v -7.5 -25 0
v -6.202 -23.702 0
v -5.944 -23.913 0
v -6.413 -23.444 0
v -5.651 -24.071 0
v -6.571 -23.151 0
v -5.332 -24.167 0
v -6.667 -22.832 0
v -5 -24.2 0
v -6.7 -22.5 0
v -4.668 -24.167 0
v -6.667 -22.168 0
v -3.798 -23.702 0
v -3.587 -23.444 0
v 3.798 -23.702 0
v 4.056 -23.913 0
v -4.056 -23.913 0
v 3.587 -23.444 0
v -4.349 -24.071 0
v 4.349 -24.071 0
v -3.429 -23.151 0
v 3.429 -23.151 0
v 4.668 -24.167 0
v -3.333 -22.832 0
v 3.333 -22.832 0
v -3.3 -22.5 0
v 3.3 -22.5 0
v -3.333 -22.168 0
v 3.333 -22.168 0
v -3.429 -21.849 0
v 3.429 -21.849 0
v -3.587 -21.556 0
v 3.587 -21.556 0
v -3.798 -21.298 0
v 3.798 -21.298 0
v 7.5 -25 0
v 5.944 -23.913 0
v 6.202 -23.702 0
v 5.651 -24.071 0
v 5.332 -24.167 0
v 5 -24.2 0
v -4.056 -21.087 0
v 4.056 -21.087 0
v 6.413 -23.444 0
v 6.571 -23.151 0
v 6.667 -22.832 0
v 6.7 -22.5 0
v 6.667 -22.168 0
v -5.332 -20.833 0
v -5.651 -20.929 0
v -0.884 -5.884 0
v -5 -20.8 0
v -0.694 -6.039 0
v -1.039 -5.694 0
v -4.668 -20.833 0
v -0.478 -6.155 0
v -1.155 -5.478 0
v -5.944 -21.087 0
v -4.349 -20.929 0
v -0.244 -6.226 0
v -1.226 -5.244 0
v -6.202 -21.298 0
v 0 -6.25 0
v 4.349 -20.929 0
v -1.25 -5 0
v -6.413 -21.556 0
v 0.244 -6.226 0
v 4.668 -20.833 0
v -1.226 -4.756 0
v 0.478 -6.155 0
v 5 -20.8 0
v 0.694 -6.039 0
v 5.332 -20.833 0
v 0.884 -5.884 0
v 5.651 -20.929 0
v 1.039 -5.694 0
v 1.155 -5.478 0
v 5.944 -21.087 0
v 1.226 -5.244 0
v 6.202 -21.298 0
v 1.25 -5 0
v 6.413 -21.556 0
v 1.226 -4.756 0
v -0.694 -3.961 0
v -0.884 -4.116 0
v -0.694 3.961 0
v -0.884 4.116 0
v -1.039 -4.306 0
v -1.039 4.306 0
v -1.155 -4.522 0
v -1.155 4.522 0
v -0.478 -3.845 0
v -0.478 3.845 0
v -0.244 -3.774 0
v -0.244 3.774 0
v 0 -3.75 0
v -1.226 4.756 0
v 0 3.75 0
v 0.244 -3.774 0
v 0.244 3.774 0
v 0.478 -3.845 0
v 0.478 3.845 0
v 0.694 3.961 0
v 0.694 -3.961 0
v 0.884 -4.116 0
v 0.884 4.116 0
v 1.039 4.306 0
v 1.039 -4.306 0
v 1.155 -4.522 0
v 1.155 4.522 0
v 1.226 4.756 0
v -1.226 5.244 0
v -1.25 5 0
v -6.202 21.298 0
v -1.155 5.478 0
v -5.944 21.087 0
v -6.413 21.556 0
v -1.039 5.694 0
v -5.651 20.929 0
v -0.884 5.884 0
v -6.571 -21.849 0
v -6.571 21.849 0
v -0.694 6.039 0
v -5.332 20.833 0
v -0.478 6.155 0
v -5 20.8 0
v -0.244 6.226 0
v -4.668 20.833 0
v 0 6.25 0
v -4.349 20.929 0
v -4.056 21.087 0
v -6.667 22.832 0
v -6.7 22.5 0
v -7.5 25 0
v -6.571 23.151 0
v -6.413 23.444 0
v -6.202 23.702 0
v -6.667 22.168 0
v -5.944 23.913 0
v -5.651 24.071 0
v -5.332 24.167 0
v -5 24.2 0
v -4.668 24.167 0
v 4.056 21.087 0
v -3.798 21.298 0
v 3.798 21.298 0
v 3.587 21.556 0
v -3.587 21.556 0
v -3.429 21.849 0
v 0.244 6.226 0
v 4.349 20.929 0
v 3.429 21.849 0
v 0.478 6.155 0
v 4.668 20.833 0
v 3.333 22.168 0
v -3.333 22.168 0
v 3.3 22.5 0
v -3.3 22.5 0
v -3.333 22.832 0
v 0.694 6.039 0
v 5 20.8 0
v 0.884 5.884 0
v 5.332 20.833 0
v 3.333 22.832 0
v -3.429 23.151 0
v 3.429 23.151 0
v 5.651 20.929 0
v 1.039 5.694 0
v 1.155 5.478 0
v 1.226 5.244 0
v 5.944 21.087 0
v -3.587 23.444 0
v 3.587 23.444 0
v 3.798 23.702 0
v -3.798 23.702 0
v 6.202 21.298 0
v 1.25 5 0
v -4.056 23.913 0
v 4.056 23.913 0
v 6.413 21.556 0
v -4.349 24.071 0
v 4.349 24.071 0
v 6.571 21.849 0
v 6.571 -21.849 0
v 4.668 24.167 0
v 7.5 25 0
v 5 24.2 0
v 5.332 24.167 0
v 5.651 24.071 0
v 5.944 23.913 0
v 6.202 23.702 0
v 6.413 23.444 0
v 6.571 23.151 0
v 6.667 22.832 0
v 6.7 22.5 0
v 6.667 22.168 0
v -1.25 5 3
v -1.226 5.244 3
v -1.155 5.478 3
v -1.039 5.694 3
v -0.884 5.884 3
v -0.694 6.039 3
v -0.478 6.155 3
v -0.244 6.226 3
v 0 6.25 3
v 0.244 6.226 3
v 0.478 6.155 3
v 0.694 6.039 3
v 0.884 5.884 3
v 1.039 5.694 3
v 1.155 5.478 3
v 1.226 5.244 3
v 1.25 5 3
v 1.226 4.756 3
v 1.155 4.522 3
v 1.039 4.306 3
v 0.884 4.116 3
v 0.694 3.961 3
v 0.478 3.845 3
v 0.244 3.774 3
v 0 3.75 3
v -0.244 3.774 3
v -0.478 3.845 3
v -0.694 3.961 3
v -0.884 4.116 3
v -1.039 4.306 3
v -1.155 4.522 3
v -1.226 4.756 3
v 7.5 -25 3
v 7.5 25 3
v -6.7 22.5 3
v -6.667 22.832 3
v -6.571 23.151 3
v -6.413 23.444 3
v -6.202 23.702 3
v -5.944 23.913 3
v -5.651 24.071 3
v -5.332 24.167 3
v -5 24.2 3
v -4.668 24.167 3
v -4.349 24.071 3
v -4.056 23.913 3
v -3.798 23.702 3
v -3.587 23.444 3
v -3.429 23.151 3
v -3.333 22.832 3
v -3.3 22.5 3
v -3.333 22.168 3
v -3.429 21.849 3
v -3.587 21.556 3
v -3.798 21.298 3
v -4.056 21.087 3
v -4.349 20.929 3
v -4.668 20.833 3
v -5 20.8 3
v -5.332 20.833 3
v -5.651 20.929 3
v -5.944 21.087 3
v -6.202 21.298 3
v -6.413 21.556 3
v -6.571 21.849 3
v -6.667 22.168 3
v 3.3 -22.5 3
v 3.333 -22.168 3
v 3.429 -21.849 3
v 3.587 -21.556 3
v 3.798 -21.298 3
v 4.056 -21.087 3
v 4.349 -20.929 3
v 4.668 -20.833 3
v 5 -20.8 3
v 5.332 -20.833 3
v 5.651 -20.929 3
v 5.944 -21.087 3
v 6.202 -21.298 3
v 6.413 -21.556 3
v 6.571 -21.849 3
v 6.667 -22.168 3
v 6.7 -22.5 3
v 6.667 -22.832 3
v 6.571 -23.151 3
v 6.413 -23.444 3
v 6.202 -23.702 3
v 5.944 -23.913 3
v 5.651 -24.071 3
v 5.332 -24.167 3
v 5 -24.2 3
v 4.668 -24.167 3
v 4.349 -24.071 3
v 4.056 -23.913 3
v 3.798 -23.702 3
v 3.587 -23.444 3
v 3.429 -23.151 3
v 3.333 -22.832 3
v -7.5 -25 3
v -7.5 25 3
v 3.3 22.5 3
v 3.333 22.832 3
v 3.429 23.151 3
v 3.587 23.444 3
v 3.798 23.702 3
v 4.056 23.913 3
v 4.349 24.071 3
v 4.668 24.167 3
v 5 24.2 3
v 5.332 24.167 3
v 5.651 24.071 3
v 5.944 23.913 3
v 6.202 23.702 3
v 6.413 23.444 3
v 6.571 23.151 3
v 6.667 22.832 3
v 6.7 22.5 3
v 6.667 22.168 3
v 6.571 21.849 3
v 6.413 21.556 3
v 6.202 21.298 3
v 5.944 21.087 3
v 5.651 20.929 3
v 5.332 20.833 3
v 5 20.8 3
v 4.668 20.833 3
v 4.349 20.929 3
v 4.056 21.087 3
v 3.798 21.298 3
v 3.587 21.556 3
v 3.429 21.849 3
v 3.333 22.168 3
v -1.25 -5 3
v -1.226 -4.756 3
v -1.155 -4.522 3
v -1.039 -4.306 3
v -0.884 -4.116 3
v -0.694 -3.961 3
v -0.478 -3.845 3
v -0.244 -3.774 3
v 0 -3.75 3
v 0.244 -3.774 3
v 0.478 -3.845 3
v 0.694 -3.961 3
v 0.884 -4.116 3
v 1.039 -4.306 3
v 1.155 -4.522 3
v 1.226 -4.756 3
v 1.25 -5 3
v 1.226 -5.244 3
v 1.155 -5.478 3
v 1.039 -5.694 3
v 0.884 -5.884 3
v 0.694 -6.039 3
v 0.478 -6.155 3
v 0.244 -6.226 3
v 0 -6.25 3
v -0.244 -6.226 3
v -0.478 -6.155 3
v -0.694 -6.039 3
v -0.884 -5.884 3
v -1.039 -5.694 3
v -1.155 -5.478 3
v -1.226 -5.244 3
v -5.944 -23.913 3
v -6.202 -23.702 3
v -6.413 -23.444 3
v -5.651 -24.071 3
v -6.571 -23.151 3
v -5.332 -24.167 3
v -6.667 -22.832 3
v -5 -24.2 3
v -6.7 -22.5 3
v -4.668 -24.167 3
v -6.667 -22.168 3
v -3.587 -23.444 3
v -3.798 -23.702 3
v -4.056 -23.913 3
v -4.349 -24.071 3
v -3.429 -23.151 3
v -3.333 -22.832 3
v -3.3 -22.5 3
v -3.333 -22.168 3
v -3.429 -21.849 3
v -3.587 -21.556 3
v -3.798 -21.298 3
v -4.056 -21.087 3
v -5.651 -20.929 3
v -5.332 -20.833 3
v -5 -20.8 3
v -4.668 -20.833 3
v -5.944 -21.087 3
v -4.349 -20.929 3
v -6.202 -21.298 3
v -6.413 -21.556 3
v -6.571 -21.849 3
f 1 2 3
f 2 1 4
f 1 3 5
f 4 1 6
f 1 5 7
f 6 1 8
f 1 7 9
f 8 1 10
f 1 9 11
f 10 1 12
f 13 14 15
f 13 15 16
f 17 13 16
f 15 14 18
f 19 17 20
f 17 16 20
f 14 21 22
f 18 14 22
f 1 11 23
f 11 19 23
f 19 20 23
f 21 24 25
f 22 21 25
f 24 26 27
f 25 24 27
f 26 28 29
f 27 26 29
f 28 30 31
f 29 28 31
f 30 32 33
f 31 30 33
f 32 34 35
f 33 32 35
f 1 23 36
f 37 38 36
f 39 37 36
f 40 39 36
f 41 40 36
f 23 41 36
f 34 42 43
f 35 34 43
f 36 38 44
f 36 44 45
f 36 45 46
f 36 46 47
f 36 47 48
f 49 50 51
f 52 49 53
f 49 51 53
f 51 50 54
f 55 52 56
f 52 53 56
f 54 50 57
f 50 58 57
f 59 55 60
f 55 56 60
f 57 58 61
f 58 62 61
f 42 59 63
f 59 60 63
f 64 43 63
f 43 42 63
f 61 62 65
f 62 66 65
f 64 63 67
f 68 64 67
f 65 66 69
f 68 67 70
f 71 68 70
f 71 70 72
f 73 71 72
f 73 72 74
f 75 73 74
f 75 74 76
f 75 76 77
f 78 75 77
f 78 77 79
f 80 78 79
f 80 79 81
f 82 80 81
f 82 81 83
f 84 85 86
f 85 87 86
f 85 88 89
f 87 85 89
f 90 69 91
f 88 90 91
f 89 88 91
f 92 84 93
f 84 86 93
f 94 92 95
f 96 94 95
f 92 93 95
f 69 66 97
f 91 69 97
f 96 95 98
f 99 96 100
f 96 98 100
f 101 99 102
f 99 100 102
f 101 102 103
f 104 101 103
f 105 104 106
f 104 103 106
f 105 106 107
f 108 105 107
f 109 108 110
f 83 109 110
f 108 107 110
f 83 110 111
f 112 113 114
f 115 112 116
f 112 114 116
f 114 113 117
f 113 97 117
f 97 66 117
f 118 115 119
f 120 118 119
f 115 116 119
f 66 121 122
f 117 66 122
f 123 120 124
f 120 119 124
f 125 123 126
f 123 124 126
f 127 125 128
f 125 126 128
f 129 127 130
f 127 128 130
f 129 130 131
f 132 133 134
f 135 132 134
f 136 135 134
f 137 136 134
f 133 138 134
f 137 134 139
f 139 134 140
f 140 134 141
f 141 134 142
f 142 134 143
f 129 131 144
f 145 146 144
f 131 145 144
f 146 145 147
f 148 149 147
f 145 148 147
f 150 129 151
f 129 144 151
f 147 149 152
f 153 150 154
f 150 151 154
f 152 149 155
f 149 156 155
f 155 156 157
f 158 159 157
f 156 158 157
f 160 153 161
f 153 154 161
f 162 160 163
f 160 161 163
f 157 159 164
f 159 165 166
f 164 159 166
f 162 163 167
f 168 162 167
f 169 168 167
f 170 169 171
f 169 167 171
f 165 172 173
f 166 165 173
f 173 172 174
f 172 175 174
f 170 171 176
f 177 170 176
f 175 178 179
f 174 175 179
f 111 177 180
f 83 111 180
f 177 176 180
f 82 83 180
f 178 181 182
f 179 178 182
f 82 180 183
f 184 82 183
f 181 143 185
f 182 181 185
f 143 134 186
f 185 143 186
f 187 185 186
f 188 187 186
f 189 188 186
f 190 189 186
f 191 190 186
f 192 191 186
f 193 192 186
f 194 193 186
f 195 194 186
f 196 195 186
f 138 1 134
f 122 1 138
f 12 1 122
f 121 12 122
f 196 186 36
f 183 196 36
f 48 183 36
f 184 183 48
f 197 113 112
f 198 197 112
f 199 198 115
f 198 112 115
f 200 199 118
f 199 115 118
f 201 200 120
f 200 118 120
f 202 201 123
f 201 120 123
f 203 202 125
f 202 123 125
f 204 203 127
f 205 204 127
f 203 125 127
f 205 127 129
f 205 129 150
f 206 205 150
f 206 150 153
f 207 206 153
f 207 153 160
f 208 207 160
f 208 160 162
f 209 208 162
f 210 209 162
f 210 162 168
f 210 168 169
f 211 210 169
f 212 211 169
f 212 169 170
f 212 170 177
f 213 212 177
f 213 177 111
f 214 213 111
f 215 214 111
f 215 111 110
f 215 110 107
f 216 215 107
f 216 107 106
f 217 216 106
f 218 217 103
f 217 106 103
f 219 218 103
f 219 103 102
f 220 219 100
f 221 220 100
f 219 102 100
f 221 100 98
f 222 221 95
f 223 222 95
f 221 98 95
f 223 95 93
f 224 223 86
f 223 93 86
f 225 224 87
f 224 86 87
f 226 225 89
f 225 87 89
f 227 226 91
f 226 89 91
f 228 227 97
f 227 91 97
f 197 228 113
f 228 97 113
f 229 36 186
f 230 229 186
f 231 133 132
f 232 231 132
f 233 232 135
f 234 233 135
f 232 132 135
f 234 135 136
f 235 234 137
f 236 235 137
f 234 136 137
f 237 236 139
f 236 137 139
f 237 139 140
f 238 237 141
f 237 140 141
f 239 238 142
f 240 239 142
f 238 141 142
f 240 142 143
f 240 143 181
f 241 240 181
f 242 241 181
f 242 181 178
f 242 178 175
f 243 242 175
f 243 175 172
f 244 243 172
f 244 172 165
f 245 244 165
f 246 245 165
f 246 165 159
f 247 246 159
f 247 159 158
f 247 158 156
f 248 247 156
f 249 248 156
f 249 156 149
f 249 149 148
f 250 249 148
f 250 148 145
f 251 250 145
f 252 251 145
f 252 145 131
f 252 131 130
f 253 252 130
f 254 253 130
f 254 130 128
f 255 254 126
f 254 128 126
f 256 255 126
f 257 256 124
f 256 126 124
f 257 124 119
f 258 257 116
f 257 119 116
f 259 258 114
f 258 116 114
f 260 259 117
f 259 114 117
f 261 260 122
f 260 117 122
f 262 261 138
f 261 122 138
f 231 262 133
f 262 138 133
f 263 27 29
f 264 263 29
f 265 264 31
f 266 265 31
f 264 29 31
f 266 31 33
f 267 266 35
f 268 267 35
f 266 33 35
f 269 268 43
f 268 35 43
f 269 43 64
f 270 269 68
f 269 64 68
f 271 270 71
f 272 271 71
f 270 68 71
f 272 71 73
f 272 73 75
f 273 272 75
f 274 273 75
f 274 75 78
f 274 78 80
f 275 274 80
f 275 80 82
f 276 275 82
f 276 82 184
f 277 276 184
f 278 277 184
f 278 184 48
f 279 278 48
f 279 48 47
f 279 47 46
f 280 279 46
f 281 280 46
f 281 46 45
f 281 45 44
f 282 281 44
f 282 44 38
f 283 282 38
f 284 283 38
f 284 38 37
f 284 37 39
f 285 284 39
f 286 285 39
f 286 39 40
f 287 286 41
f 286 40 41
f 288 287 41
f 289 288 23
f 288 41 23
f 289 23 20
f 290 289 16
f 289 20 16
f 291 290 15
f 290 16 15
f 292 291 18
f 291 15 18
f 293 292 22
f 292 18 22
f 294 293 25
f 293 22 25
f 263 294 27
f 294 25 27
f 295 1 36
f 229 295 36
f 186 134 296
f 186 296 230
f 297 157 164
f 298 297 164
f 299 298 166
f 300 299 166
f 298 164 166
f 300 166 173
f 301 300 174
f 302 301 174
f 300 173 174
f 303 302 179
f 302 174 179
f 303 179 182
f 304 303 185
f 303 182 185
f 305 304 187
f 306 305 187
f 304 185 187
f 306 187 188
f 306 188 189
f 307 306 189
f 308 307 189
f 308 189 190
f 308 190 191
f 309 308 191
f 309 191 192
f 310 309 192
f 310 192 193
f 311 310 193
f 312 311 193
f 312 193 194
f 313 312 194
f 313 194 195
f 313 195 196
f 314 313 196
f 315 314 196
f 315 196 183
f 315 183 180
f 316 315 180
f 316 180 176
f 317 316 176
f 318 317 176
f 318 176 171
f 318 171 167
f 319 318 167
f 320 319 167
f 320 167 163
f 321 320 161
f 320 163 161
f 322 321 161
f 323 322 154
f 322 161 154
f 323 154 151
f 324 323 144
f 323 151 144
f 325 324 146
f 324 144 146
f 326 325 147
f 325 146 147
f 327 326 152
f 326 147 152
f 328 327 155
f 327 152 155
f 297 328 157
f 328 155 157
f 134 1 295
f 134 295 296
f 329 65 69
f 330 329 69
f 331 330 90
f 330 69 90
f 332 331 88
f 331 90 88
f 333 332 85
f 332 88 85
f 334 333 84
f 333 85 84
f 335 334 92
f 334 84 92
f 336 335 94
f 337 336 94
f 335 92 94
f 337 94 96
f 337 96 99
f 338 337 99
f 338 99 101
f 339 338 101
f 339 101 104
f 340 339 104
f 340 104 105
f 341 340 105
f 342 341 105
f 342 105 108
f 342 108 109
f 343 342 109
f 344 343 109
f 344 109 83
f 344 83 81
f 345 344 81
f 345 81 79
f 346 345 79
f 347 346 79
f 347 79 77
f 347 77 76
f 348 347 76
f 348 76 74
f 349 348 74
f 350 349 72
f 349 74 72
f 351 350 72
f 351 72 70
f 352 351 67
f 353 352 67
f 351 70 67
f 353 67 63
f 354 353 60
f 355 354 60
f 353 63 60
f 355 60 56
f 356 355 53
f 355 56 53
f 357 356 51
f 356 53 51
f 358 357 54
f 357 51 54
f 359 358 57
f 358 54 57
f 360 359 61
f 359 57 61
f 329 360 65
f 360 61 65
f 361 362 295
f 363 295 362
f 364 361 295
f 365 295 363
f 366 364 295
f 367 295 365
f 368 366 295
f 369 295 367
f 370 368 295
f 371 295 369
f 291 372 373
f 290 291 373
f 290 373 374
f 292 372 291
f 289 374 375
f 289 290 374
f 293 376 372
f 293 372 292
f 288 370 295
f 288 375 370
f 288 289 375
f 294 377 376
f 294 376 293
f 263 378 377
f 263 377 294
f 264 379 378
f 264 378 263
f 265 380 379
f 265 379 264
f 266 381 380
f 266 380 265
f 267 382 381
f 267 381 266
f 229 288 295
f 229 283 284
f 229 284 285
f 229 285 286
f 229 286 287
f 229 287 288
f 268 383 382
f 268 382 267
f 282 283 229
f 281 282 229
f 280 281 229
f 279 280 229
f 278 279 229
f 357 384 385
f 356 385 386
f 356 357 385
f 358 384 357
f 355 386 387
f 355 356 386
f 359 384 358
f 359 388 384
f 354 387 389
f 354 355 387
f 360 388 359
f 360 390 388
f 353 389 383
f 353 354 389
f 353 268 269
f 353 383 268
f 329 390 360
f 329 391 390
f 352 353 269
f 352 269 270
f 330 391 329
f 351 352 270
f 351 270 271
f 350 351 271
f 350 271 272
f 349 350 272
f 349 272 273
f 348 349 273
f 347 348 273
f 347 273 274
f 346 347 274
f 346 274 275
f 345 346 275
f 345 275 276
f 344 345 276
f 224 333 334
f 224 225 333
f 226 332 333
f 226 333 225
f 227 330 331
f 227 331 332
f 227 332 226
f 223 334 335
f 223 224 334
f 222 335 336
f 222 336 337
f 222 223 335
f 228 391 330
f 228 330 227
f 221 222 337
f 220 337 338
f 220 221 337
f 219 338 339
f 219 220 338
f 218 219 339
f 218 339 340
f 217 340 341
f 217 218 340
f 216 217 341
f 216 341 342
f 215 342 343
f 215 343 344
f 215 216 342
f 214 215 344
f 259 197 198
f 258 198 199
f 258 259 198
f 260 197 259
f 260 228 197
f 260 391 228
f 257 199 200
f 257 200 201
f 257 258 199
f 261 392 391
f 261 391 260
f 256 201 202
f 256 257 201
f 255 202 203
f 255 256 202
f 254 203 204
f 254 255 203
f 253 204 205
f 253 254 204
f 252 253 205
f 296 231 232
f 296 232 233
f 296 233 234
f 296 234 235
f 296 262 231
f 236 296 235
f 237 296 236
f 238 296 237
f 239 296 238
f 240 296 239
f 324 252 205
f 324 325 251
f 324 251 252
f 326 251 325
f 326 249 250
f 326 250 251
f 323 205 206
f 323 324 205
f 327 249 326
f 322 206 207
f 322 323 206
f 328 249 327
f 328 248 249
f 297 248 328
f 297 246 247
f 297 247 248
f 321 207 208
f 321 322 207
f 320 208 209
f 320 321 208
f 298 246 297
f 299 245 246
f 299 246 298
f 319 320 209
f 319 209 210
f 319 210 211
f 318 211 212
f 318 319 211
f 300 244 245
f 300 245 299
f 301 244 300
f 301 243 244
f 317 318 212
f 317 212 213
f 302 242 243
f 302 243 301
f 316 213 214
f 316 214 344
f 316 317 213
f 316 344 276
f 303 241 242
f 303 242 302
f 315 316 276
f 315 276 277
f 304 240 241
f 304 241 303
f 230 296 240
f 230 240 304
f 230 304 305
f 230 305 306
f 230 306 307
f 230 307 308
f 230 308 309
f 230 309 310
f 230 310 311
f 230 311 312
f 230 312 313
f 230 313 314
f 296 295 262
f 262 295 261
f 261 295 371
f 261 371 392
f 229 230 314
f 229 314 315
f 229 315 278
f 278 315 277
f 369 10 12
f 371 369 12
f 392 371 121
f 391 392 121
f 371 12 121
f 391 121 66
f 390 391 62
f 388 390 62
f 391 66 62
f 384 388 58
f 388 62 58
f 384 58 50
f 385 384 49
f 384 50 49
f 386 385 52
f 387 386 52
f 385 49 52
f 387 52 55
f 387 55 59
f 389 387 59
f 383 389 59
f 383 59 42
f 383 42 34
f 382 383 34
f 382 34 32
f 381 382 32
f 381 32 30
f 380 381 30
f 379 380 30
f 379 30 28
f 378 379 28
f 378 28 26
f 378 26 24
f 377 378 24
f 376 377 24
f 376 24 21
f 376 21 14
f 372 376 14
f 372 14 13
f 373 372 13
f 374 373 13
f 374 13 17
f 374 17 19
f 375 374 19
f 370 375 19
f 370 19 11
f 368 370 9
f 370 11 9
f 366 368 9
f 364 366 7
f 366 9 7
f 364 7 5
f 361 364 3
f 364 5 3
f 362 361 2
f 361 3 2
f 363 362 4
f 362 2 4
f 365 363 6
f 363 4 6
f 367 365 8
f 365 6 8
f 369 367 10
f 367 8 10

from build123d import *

# Parameters (mm, degrees)
SKETCH_1_W             = 15
SKETCH_1_H             = 50
EXTRUDE_1_DEPTH        = 3
HOLE_WIZARD_M3_1_D     = 2.5
HOLE_WIZARD_M3_1_DEPTH = 3
HOLE_WIZARD_M3_1_2_D   = 3.4


with BuildPart() as part:
    # 스케치1 → 보스-돌출1 (new body)
    with BuildSketch(Plane.XY):
        Rectangle(SKETCH_1_W, SKETCH_1_H)
    extrude(amount=EXTRUDE_1_DEPTH)

    # Hole Wizard M3 _ _1
    with Locations(Plane.XY.offset(3)):
        with Locations((0, 5), (0, -5)):
            Hole(HOLE_WIZARD_M3_1_D / 2, depth=HOLE_WIZARD_M3_1_DEPTH)

    # Hole Wizard M3 _ _1 2 (through all)
    with Locations(Plane.XY.offset(3)):
        with Locations((-5, 22.5), (5, 22.5), (-5, -22.5), (5, -22.5)):
            Hole(HOLE_WIZARD_M3_1_2_D / 2)


solid = part.part
